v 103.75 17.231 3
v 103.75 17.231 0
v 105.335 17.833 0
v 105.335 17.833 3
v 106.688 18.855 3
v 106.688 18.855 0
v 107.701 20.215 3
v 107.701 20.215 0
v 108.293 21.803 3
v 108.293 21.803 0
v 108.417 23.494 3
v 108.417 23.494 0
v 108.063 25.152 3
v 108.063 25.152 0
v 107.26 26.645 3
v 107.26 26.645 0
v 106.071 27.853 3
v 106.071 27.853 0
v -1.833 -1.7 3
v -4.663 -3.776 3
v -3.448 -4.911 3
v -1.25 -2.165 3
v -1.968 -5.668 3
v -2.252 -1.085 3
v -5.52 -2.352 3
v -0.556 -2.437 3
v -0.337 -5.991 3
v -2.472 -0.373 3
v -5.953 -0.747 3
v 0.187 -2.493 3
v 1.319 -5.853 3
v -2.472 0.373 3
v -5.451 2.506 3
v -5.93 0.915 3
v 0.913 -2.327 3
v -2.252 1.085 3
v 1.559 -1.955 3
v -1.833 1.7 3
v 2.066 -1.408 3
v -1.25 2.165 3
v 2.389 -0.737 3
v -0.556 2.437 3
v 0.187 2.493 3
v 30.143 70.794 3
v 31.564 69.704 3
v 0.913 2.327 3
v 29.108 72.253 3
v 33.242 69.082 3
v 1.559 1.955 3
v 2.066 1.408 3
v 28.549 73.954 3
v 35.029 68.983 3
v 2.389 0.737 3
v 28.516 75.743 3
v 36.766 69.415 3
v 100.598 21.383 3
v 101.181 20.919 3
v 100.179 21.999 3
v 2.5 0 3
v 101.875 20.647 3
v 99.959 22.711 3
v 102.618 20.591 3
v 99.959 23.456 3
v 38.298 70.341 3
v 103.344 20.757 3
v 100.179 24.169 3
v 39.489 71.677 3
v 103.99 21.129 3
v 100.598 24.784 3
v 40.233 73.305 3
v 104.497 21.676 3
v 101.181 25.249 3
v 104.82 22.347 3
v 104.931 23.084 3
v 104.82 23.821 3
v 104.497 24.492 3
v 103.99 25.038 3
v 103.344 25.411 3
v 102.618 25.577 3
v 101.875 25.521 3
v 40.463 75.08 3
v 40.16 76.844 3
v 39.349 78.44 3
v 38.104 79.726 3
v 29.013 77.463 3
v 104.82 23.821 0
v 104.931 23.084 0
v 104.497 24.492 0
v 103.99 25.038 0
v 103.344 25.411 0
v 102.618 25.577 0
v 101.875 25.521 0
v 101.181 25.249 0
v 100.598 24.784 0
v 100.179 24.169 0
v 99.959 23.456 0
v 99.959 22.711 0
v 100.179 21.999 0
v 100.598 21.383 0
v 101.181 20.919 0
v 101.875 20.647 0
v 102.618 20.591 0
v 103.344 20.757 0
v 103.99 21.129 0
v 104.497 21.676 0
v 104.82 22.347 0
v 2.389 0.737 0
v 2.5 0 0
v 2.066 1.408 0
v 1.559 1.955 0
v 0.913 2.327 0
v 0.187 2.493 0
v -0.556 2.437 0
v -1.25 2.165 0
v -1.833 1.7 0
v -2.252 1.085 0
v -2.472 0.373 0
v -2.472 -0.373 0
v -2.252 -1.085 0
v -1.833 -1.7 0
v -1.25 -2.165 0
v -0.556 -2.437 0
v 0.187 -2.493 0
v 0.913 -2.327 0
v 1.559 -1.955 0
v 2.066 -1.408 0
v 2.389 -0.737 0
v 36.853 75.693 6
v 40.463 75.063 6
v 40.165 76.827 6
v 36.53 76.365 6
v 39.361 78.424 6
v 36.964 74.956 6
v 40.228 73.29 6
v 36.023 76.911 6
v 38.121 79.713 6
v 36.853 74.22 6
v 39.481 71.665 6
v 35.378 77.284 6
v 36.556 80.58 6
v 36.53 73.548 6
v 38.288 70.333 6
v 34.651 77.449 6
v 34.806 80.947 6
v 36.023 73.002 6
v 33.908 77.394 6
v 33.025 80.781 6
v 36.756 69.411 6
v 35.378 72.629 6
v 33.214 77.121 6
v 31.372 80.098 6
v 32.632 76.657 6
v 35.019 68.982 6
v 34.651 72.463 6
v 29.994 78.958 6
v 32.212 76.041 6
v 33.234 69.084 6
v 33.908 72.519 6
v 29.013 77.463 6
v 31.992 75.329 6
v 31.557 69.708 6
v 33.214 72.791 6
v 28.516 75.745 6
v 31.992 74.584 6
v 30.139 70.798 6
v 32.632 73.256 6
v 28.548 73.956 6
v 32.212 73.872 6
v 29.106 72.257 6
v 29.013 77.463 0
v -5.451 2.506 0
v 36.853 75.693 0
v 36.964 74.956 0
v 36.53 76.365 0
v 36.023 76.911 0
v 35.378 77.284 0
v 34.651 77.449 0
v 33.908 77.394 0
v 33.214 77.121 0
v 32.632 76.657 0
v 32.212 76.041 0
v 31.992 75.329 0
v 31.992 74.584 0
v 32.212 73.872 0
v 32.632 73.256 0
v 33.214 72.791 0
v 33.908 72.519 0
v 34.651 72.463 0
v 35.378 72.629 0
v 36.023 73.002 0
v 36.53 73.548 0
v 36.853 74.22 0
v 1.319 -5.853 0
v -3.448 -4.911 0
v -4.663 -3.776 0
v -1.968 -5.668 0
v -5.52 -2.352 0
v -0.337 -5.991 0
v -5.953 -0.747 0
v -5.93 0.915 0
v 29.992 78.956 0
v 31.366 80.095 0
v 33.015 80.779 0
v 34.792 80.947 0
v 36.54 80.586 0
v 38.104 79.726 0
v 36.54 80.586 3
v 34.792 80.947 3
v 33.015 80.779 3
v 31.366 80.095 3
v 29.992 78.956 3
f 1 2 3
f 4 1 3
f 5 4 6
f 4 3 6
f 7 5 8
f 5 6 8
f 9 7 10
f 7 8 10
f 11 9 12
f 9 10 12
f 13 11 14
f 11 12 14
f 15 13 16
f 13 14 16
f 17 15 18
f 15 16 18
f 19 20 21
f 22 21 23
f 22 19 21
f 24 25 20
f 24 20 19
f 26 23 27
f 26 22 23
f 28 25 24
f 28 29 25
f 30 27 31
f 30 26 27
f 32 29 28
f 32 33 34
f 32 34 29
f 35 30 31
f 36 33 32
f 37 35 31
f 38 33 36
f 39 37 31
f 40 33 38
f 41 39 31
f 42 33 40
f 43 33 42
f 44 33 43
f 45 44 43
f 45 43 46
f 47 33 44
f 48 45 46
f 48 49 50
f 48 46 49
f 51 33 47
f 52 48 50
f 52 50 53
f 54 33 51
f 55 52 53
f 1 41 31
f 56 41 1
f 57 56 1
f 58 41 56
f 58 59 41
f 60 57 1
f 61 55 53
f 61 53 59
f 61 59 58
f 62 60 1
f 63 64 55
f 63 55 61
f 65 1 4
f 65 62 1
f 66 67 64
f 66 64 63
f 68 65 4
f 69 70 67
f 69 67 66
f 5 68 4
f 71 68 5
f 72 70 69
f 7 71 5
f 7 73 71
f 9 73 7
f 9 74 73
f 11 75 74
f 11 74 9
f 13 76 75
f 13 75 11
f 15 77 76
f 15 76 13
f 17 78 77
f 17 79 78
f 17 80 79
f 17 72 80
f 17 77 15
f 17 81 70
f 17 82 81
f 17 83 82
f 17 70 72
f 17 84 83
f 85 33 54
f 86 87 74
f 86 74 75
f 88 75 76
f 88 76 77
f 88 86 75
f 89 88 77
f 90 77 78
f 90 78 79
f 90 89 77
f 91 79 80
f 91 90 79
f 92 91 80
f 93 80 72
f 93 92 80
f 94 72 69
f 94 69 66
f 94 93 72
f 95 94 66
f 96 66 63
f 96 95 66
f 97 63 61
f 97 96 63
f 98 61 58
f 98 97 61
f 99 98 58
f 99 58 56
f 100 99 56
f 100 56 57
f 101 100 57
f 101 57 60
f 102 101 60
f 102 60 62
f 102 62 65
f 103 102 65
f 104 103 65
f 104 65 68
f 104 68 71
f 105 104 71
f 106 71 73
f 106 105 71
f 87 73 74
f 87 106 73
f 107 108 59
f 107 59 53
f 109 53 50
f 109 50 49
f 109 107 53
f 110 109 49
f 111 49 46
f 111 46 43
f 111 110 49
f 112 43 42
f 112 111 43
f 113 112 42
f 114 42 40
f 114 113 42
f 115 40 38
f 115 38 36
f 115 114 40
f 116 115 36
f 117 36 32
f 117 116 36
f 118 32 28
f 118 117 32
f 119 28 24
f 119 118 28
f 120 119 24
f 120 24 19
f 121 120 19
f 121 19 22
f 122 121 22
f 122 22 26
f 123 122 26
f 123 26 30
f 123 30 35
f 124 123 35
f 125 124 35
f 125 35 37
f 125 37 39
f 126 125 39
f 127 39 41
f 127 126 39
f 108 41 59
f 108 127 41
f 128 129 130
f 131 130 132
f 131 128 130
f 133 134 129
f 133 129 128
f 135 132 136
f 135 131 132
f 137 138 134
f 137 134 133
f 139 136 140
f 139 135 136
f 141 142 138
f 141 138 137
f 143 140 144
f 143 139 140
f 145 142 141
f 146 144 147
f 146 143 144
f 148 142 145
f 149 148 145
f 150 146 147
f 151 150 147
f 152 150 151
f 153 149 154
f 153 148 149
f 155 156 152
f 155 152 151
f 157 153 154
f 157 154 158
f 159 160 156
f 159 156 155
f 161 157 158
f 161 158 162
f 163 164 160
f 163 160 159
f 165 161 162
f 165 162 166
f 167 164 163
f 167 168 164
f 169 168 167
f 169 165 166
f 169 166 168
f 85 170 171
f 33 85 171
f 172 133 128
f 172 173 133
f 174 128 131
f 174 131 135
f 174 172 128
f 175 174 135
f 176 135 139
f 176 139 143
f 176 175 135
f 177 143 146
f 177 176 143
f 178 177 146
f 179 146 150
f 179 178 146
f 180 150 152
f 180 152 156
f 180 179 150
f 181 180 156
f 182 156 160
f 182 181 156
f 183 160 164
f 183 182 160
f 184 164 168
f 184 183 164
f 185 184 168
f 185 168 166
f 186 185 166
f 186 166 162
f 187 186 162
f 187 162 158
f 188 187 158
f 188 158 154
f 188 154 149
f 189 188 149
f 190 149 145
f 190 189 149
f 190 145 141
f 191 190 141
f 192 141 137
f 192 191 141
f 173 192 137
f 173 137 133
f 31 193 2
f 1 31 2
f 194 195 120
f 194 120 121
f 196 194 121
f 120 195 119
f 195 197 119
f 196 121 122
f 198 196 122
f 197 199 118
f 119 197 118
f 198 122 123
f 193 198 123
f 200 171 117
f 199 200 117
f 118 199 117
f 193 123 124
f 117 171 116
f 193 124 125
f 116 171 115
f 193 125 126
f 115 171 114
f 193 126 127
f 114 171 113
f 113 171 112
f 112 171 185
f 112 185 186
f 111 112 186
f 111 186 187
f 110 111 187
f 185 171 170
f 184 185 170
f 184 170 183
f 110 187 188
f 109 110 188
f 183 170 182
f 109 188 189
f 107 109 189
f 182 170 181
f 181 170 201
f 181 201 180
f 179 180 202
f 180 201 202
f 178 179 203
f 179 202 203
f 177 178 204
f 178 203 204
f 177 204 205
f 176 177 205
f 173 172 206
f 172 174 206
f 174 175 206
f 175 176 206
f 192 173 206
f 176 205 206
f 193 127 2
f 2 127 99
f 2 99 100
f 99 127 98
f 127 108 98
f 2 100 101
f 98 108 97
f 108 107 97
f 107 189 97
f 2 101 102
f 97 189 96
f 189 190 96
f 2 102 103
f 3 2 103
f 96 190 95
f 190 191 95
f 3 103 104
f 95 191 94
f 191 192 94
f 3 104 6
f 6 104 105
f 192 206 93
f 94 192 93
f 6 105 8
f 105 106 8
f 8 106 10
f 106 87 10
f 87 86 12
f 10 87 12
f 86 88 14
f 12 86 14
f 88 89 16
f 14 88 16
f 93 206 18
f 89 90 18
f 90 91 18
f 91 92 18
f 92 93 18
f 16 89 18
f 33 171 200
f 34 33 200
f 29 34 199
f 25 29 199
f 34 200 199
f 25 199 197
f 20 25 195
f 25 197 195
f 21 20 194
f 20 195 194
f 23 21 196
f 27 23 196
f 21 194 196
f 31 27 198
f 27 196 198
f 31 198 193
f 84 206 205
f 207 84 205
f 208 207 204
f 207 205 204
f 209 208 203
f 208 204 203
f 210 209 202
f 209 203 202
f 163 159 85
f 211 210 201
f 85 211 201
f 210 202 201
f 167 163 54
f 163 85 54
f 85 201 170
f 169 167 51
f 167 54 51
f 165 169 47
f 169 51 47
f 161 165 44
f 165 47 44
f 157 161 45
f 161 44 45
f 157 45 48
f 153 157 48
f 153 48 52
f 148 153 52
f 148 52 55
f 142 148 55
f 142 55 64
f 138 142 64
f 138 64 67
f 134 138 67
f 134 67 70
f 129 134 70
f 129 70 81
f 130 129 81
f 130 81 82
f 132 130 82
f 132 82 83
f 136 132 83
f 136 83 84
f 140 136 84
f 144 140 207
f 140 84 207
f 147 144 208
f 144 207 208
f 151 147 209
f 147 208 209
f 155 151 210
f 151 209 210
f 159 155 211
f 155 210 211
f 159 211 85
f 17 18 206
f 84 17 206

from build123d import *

# Parameters (mm, degrees)
SKETCH_1_R      = 6
SKETCH_1_R_2    = 2.5
EXTRUDE_1_DEPTH = 3
EXTRUDE_START   = 3
SKETCH_1_3_R    = 6
SKETCH_1_3_R_2  = 2.5
EXTRUDE_2_DEPTH = 3


with BuildPart() as part:
    # 草图1 → 凸台-拉伸1 (new body)
    # profile 1 of 4: a face of its own
    with BuildSketch(Plane.XY):
        with BuildLine():
            ThreePointArc((40.464305263, 74.956398411), (33.181387998, 69.095159353), (29.012930833, 77.462893339))
            Line((29.012930833, 77.462893339), (-5.45137443, 2.506494928))
            ThreePointArc((-5.45137443, 2.506494928), (1.282917266, 5.861239058), (6, 0))
            ThreePointArc((6, 0), (4.685854424, -3.747368186), (1.319077226, -5.853207264))
            Line((1.319077226, -5.853207264), (103.75020434, 17.230644193))
            ThreePointArc((103.75020434, 17.230644193), (96.5694233, 24.364643554), (106.071305848, 27.85345299))
            Line((106.071305848, 27.85345299), (38.104483997, 79.725999944))
            ThreePointArc((38.104483997, 79.725999944), (39.842086981, 77.61712459), (40.464305263, 74.956398411))
        make_face()
    # profile 2 of 4: a face of its own
    with BuildSketch(Plane.XY):
        with Locations((34.464305263, 74.956398411)):
            Circle(SKETCH_1_R)
        with Locations((34.464305263, 74.956398411)):
            Circle(SKETCH_1_R_2, mode=Mode.SUBTRACT)
    # profile 3 of 4: a face of its own
    with BuildSketch(Plane.XY):
        Circle(SKETCH_1_R)
        Circle(SKETCH_1_R_2, mode=Mode.SUBTRACT)
    # profile 4 of 4: a face of its own
    with BuildSketch(Plane.XY):
        with Locations((102.431127114, 23.083851457)):
            Circle(SKETCH_1_R)
        with Locations((102.431127114, 23.083851457)):
            Circle(SKETCH_1_R_2, mode=Mode.SUBTRACT)
    extrude(amount=EXTRUDE_1_DEPTH)

    # 草图1<3> → 凸台-拉伸2 (add)
    with BuildSketch(Plane.XY.offset(EXTRUDE_START)):
        with Locations(Location((34.464305263, 74.956398411, 0), (0, 0, 155.307436438))):
            Circle(SKETCH_1_3_R)
        with Locations((34.464305263, 74.956398411)):
            Circle(SKETCH_1_3_R_2, mode=Mode.SUBTRACT)
    extrude(amount=EXTRUDE_2_DEPTH)


solid = part.part
